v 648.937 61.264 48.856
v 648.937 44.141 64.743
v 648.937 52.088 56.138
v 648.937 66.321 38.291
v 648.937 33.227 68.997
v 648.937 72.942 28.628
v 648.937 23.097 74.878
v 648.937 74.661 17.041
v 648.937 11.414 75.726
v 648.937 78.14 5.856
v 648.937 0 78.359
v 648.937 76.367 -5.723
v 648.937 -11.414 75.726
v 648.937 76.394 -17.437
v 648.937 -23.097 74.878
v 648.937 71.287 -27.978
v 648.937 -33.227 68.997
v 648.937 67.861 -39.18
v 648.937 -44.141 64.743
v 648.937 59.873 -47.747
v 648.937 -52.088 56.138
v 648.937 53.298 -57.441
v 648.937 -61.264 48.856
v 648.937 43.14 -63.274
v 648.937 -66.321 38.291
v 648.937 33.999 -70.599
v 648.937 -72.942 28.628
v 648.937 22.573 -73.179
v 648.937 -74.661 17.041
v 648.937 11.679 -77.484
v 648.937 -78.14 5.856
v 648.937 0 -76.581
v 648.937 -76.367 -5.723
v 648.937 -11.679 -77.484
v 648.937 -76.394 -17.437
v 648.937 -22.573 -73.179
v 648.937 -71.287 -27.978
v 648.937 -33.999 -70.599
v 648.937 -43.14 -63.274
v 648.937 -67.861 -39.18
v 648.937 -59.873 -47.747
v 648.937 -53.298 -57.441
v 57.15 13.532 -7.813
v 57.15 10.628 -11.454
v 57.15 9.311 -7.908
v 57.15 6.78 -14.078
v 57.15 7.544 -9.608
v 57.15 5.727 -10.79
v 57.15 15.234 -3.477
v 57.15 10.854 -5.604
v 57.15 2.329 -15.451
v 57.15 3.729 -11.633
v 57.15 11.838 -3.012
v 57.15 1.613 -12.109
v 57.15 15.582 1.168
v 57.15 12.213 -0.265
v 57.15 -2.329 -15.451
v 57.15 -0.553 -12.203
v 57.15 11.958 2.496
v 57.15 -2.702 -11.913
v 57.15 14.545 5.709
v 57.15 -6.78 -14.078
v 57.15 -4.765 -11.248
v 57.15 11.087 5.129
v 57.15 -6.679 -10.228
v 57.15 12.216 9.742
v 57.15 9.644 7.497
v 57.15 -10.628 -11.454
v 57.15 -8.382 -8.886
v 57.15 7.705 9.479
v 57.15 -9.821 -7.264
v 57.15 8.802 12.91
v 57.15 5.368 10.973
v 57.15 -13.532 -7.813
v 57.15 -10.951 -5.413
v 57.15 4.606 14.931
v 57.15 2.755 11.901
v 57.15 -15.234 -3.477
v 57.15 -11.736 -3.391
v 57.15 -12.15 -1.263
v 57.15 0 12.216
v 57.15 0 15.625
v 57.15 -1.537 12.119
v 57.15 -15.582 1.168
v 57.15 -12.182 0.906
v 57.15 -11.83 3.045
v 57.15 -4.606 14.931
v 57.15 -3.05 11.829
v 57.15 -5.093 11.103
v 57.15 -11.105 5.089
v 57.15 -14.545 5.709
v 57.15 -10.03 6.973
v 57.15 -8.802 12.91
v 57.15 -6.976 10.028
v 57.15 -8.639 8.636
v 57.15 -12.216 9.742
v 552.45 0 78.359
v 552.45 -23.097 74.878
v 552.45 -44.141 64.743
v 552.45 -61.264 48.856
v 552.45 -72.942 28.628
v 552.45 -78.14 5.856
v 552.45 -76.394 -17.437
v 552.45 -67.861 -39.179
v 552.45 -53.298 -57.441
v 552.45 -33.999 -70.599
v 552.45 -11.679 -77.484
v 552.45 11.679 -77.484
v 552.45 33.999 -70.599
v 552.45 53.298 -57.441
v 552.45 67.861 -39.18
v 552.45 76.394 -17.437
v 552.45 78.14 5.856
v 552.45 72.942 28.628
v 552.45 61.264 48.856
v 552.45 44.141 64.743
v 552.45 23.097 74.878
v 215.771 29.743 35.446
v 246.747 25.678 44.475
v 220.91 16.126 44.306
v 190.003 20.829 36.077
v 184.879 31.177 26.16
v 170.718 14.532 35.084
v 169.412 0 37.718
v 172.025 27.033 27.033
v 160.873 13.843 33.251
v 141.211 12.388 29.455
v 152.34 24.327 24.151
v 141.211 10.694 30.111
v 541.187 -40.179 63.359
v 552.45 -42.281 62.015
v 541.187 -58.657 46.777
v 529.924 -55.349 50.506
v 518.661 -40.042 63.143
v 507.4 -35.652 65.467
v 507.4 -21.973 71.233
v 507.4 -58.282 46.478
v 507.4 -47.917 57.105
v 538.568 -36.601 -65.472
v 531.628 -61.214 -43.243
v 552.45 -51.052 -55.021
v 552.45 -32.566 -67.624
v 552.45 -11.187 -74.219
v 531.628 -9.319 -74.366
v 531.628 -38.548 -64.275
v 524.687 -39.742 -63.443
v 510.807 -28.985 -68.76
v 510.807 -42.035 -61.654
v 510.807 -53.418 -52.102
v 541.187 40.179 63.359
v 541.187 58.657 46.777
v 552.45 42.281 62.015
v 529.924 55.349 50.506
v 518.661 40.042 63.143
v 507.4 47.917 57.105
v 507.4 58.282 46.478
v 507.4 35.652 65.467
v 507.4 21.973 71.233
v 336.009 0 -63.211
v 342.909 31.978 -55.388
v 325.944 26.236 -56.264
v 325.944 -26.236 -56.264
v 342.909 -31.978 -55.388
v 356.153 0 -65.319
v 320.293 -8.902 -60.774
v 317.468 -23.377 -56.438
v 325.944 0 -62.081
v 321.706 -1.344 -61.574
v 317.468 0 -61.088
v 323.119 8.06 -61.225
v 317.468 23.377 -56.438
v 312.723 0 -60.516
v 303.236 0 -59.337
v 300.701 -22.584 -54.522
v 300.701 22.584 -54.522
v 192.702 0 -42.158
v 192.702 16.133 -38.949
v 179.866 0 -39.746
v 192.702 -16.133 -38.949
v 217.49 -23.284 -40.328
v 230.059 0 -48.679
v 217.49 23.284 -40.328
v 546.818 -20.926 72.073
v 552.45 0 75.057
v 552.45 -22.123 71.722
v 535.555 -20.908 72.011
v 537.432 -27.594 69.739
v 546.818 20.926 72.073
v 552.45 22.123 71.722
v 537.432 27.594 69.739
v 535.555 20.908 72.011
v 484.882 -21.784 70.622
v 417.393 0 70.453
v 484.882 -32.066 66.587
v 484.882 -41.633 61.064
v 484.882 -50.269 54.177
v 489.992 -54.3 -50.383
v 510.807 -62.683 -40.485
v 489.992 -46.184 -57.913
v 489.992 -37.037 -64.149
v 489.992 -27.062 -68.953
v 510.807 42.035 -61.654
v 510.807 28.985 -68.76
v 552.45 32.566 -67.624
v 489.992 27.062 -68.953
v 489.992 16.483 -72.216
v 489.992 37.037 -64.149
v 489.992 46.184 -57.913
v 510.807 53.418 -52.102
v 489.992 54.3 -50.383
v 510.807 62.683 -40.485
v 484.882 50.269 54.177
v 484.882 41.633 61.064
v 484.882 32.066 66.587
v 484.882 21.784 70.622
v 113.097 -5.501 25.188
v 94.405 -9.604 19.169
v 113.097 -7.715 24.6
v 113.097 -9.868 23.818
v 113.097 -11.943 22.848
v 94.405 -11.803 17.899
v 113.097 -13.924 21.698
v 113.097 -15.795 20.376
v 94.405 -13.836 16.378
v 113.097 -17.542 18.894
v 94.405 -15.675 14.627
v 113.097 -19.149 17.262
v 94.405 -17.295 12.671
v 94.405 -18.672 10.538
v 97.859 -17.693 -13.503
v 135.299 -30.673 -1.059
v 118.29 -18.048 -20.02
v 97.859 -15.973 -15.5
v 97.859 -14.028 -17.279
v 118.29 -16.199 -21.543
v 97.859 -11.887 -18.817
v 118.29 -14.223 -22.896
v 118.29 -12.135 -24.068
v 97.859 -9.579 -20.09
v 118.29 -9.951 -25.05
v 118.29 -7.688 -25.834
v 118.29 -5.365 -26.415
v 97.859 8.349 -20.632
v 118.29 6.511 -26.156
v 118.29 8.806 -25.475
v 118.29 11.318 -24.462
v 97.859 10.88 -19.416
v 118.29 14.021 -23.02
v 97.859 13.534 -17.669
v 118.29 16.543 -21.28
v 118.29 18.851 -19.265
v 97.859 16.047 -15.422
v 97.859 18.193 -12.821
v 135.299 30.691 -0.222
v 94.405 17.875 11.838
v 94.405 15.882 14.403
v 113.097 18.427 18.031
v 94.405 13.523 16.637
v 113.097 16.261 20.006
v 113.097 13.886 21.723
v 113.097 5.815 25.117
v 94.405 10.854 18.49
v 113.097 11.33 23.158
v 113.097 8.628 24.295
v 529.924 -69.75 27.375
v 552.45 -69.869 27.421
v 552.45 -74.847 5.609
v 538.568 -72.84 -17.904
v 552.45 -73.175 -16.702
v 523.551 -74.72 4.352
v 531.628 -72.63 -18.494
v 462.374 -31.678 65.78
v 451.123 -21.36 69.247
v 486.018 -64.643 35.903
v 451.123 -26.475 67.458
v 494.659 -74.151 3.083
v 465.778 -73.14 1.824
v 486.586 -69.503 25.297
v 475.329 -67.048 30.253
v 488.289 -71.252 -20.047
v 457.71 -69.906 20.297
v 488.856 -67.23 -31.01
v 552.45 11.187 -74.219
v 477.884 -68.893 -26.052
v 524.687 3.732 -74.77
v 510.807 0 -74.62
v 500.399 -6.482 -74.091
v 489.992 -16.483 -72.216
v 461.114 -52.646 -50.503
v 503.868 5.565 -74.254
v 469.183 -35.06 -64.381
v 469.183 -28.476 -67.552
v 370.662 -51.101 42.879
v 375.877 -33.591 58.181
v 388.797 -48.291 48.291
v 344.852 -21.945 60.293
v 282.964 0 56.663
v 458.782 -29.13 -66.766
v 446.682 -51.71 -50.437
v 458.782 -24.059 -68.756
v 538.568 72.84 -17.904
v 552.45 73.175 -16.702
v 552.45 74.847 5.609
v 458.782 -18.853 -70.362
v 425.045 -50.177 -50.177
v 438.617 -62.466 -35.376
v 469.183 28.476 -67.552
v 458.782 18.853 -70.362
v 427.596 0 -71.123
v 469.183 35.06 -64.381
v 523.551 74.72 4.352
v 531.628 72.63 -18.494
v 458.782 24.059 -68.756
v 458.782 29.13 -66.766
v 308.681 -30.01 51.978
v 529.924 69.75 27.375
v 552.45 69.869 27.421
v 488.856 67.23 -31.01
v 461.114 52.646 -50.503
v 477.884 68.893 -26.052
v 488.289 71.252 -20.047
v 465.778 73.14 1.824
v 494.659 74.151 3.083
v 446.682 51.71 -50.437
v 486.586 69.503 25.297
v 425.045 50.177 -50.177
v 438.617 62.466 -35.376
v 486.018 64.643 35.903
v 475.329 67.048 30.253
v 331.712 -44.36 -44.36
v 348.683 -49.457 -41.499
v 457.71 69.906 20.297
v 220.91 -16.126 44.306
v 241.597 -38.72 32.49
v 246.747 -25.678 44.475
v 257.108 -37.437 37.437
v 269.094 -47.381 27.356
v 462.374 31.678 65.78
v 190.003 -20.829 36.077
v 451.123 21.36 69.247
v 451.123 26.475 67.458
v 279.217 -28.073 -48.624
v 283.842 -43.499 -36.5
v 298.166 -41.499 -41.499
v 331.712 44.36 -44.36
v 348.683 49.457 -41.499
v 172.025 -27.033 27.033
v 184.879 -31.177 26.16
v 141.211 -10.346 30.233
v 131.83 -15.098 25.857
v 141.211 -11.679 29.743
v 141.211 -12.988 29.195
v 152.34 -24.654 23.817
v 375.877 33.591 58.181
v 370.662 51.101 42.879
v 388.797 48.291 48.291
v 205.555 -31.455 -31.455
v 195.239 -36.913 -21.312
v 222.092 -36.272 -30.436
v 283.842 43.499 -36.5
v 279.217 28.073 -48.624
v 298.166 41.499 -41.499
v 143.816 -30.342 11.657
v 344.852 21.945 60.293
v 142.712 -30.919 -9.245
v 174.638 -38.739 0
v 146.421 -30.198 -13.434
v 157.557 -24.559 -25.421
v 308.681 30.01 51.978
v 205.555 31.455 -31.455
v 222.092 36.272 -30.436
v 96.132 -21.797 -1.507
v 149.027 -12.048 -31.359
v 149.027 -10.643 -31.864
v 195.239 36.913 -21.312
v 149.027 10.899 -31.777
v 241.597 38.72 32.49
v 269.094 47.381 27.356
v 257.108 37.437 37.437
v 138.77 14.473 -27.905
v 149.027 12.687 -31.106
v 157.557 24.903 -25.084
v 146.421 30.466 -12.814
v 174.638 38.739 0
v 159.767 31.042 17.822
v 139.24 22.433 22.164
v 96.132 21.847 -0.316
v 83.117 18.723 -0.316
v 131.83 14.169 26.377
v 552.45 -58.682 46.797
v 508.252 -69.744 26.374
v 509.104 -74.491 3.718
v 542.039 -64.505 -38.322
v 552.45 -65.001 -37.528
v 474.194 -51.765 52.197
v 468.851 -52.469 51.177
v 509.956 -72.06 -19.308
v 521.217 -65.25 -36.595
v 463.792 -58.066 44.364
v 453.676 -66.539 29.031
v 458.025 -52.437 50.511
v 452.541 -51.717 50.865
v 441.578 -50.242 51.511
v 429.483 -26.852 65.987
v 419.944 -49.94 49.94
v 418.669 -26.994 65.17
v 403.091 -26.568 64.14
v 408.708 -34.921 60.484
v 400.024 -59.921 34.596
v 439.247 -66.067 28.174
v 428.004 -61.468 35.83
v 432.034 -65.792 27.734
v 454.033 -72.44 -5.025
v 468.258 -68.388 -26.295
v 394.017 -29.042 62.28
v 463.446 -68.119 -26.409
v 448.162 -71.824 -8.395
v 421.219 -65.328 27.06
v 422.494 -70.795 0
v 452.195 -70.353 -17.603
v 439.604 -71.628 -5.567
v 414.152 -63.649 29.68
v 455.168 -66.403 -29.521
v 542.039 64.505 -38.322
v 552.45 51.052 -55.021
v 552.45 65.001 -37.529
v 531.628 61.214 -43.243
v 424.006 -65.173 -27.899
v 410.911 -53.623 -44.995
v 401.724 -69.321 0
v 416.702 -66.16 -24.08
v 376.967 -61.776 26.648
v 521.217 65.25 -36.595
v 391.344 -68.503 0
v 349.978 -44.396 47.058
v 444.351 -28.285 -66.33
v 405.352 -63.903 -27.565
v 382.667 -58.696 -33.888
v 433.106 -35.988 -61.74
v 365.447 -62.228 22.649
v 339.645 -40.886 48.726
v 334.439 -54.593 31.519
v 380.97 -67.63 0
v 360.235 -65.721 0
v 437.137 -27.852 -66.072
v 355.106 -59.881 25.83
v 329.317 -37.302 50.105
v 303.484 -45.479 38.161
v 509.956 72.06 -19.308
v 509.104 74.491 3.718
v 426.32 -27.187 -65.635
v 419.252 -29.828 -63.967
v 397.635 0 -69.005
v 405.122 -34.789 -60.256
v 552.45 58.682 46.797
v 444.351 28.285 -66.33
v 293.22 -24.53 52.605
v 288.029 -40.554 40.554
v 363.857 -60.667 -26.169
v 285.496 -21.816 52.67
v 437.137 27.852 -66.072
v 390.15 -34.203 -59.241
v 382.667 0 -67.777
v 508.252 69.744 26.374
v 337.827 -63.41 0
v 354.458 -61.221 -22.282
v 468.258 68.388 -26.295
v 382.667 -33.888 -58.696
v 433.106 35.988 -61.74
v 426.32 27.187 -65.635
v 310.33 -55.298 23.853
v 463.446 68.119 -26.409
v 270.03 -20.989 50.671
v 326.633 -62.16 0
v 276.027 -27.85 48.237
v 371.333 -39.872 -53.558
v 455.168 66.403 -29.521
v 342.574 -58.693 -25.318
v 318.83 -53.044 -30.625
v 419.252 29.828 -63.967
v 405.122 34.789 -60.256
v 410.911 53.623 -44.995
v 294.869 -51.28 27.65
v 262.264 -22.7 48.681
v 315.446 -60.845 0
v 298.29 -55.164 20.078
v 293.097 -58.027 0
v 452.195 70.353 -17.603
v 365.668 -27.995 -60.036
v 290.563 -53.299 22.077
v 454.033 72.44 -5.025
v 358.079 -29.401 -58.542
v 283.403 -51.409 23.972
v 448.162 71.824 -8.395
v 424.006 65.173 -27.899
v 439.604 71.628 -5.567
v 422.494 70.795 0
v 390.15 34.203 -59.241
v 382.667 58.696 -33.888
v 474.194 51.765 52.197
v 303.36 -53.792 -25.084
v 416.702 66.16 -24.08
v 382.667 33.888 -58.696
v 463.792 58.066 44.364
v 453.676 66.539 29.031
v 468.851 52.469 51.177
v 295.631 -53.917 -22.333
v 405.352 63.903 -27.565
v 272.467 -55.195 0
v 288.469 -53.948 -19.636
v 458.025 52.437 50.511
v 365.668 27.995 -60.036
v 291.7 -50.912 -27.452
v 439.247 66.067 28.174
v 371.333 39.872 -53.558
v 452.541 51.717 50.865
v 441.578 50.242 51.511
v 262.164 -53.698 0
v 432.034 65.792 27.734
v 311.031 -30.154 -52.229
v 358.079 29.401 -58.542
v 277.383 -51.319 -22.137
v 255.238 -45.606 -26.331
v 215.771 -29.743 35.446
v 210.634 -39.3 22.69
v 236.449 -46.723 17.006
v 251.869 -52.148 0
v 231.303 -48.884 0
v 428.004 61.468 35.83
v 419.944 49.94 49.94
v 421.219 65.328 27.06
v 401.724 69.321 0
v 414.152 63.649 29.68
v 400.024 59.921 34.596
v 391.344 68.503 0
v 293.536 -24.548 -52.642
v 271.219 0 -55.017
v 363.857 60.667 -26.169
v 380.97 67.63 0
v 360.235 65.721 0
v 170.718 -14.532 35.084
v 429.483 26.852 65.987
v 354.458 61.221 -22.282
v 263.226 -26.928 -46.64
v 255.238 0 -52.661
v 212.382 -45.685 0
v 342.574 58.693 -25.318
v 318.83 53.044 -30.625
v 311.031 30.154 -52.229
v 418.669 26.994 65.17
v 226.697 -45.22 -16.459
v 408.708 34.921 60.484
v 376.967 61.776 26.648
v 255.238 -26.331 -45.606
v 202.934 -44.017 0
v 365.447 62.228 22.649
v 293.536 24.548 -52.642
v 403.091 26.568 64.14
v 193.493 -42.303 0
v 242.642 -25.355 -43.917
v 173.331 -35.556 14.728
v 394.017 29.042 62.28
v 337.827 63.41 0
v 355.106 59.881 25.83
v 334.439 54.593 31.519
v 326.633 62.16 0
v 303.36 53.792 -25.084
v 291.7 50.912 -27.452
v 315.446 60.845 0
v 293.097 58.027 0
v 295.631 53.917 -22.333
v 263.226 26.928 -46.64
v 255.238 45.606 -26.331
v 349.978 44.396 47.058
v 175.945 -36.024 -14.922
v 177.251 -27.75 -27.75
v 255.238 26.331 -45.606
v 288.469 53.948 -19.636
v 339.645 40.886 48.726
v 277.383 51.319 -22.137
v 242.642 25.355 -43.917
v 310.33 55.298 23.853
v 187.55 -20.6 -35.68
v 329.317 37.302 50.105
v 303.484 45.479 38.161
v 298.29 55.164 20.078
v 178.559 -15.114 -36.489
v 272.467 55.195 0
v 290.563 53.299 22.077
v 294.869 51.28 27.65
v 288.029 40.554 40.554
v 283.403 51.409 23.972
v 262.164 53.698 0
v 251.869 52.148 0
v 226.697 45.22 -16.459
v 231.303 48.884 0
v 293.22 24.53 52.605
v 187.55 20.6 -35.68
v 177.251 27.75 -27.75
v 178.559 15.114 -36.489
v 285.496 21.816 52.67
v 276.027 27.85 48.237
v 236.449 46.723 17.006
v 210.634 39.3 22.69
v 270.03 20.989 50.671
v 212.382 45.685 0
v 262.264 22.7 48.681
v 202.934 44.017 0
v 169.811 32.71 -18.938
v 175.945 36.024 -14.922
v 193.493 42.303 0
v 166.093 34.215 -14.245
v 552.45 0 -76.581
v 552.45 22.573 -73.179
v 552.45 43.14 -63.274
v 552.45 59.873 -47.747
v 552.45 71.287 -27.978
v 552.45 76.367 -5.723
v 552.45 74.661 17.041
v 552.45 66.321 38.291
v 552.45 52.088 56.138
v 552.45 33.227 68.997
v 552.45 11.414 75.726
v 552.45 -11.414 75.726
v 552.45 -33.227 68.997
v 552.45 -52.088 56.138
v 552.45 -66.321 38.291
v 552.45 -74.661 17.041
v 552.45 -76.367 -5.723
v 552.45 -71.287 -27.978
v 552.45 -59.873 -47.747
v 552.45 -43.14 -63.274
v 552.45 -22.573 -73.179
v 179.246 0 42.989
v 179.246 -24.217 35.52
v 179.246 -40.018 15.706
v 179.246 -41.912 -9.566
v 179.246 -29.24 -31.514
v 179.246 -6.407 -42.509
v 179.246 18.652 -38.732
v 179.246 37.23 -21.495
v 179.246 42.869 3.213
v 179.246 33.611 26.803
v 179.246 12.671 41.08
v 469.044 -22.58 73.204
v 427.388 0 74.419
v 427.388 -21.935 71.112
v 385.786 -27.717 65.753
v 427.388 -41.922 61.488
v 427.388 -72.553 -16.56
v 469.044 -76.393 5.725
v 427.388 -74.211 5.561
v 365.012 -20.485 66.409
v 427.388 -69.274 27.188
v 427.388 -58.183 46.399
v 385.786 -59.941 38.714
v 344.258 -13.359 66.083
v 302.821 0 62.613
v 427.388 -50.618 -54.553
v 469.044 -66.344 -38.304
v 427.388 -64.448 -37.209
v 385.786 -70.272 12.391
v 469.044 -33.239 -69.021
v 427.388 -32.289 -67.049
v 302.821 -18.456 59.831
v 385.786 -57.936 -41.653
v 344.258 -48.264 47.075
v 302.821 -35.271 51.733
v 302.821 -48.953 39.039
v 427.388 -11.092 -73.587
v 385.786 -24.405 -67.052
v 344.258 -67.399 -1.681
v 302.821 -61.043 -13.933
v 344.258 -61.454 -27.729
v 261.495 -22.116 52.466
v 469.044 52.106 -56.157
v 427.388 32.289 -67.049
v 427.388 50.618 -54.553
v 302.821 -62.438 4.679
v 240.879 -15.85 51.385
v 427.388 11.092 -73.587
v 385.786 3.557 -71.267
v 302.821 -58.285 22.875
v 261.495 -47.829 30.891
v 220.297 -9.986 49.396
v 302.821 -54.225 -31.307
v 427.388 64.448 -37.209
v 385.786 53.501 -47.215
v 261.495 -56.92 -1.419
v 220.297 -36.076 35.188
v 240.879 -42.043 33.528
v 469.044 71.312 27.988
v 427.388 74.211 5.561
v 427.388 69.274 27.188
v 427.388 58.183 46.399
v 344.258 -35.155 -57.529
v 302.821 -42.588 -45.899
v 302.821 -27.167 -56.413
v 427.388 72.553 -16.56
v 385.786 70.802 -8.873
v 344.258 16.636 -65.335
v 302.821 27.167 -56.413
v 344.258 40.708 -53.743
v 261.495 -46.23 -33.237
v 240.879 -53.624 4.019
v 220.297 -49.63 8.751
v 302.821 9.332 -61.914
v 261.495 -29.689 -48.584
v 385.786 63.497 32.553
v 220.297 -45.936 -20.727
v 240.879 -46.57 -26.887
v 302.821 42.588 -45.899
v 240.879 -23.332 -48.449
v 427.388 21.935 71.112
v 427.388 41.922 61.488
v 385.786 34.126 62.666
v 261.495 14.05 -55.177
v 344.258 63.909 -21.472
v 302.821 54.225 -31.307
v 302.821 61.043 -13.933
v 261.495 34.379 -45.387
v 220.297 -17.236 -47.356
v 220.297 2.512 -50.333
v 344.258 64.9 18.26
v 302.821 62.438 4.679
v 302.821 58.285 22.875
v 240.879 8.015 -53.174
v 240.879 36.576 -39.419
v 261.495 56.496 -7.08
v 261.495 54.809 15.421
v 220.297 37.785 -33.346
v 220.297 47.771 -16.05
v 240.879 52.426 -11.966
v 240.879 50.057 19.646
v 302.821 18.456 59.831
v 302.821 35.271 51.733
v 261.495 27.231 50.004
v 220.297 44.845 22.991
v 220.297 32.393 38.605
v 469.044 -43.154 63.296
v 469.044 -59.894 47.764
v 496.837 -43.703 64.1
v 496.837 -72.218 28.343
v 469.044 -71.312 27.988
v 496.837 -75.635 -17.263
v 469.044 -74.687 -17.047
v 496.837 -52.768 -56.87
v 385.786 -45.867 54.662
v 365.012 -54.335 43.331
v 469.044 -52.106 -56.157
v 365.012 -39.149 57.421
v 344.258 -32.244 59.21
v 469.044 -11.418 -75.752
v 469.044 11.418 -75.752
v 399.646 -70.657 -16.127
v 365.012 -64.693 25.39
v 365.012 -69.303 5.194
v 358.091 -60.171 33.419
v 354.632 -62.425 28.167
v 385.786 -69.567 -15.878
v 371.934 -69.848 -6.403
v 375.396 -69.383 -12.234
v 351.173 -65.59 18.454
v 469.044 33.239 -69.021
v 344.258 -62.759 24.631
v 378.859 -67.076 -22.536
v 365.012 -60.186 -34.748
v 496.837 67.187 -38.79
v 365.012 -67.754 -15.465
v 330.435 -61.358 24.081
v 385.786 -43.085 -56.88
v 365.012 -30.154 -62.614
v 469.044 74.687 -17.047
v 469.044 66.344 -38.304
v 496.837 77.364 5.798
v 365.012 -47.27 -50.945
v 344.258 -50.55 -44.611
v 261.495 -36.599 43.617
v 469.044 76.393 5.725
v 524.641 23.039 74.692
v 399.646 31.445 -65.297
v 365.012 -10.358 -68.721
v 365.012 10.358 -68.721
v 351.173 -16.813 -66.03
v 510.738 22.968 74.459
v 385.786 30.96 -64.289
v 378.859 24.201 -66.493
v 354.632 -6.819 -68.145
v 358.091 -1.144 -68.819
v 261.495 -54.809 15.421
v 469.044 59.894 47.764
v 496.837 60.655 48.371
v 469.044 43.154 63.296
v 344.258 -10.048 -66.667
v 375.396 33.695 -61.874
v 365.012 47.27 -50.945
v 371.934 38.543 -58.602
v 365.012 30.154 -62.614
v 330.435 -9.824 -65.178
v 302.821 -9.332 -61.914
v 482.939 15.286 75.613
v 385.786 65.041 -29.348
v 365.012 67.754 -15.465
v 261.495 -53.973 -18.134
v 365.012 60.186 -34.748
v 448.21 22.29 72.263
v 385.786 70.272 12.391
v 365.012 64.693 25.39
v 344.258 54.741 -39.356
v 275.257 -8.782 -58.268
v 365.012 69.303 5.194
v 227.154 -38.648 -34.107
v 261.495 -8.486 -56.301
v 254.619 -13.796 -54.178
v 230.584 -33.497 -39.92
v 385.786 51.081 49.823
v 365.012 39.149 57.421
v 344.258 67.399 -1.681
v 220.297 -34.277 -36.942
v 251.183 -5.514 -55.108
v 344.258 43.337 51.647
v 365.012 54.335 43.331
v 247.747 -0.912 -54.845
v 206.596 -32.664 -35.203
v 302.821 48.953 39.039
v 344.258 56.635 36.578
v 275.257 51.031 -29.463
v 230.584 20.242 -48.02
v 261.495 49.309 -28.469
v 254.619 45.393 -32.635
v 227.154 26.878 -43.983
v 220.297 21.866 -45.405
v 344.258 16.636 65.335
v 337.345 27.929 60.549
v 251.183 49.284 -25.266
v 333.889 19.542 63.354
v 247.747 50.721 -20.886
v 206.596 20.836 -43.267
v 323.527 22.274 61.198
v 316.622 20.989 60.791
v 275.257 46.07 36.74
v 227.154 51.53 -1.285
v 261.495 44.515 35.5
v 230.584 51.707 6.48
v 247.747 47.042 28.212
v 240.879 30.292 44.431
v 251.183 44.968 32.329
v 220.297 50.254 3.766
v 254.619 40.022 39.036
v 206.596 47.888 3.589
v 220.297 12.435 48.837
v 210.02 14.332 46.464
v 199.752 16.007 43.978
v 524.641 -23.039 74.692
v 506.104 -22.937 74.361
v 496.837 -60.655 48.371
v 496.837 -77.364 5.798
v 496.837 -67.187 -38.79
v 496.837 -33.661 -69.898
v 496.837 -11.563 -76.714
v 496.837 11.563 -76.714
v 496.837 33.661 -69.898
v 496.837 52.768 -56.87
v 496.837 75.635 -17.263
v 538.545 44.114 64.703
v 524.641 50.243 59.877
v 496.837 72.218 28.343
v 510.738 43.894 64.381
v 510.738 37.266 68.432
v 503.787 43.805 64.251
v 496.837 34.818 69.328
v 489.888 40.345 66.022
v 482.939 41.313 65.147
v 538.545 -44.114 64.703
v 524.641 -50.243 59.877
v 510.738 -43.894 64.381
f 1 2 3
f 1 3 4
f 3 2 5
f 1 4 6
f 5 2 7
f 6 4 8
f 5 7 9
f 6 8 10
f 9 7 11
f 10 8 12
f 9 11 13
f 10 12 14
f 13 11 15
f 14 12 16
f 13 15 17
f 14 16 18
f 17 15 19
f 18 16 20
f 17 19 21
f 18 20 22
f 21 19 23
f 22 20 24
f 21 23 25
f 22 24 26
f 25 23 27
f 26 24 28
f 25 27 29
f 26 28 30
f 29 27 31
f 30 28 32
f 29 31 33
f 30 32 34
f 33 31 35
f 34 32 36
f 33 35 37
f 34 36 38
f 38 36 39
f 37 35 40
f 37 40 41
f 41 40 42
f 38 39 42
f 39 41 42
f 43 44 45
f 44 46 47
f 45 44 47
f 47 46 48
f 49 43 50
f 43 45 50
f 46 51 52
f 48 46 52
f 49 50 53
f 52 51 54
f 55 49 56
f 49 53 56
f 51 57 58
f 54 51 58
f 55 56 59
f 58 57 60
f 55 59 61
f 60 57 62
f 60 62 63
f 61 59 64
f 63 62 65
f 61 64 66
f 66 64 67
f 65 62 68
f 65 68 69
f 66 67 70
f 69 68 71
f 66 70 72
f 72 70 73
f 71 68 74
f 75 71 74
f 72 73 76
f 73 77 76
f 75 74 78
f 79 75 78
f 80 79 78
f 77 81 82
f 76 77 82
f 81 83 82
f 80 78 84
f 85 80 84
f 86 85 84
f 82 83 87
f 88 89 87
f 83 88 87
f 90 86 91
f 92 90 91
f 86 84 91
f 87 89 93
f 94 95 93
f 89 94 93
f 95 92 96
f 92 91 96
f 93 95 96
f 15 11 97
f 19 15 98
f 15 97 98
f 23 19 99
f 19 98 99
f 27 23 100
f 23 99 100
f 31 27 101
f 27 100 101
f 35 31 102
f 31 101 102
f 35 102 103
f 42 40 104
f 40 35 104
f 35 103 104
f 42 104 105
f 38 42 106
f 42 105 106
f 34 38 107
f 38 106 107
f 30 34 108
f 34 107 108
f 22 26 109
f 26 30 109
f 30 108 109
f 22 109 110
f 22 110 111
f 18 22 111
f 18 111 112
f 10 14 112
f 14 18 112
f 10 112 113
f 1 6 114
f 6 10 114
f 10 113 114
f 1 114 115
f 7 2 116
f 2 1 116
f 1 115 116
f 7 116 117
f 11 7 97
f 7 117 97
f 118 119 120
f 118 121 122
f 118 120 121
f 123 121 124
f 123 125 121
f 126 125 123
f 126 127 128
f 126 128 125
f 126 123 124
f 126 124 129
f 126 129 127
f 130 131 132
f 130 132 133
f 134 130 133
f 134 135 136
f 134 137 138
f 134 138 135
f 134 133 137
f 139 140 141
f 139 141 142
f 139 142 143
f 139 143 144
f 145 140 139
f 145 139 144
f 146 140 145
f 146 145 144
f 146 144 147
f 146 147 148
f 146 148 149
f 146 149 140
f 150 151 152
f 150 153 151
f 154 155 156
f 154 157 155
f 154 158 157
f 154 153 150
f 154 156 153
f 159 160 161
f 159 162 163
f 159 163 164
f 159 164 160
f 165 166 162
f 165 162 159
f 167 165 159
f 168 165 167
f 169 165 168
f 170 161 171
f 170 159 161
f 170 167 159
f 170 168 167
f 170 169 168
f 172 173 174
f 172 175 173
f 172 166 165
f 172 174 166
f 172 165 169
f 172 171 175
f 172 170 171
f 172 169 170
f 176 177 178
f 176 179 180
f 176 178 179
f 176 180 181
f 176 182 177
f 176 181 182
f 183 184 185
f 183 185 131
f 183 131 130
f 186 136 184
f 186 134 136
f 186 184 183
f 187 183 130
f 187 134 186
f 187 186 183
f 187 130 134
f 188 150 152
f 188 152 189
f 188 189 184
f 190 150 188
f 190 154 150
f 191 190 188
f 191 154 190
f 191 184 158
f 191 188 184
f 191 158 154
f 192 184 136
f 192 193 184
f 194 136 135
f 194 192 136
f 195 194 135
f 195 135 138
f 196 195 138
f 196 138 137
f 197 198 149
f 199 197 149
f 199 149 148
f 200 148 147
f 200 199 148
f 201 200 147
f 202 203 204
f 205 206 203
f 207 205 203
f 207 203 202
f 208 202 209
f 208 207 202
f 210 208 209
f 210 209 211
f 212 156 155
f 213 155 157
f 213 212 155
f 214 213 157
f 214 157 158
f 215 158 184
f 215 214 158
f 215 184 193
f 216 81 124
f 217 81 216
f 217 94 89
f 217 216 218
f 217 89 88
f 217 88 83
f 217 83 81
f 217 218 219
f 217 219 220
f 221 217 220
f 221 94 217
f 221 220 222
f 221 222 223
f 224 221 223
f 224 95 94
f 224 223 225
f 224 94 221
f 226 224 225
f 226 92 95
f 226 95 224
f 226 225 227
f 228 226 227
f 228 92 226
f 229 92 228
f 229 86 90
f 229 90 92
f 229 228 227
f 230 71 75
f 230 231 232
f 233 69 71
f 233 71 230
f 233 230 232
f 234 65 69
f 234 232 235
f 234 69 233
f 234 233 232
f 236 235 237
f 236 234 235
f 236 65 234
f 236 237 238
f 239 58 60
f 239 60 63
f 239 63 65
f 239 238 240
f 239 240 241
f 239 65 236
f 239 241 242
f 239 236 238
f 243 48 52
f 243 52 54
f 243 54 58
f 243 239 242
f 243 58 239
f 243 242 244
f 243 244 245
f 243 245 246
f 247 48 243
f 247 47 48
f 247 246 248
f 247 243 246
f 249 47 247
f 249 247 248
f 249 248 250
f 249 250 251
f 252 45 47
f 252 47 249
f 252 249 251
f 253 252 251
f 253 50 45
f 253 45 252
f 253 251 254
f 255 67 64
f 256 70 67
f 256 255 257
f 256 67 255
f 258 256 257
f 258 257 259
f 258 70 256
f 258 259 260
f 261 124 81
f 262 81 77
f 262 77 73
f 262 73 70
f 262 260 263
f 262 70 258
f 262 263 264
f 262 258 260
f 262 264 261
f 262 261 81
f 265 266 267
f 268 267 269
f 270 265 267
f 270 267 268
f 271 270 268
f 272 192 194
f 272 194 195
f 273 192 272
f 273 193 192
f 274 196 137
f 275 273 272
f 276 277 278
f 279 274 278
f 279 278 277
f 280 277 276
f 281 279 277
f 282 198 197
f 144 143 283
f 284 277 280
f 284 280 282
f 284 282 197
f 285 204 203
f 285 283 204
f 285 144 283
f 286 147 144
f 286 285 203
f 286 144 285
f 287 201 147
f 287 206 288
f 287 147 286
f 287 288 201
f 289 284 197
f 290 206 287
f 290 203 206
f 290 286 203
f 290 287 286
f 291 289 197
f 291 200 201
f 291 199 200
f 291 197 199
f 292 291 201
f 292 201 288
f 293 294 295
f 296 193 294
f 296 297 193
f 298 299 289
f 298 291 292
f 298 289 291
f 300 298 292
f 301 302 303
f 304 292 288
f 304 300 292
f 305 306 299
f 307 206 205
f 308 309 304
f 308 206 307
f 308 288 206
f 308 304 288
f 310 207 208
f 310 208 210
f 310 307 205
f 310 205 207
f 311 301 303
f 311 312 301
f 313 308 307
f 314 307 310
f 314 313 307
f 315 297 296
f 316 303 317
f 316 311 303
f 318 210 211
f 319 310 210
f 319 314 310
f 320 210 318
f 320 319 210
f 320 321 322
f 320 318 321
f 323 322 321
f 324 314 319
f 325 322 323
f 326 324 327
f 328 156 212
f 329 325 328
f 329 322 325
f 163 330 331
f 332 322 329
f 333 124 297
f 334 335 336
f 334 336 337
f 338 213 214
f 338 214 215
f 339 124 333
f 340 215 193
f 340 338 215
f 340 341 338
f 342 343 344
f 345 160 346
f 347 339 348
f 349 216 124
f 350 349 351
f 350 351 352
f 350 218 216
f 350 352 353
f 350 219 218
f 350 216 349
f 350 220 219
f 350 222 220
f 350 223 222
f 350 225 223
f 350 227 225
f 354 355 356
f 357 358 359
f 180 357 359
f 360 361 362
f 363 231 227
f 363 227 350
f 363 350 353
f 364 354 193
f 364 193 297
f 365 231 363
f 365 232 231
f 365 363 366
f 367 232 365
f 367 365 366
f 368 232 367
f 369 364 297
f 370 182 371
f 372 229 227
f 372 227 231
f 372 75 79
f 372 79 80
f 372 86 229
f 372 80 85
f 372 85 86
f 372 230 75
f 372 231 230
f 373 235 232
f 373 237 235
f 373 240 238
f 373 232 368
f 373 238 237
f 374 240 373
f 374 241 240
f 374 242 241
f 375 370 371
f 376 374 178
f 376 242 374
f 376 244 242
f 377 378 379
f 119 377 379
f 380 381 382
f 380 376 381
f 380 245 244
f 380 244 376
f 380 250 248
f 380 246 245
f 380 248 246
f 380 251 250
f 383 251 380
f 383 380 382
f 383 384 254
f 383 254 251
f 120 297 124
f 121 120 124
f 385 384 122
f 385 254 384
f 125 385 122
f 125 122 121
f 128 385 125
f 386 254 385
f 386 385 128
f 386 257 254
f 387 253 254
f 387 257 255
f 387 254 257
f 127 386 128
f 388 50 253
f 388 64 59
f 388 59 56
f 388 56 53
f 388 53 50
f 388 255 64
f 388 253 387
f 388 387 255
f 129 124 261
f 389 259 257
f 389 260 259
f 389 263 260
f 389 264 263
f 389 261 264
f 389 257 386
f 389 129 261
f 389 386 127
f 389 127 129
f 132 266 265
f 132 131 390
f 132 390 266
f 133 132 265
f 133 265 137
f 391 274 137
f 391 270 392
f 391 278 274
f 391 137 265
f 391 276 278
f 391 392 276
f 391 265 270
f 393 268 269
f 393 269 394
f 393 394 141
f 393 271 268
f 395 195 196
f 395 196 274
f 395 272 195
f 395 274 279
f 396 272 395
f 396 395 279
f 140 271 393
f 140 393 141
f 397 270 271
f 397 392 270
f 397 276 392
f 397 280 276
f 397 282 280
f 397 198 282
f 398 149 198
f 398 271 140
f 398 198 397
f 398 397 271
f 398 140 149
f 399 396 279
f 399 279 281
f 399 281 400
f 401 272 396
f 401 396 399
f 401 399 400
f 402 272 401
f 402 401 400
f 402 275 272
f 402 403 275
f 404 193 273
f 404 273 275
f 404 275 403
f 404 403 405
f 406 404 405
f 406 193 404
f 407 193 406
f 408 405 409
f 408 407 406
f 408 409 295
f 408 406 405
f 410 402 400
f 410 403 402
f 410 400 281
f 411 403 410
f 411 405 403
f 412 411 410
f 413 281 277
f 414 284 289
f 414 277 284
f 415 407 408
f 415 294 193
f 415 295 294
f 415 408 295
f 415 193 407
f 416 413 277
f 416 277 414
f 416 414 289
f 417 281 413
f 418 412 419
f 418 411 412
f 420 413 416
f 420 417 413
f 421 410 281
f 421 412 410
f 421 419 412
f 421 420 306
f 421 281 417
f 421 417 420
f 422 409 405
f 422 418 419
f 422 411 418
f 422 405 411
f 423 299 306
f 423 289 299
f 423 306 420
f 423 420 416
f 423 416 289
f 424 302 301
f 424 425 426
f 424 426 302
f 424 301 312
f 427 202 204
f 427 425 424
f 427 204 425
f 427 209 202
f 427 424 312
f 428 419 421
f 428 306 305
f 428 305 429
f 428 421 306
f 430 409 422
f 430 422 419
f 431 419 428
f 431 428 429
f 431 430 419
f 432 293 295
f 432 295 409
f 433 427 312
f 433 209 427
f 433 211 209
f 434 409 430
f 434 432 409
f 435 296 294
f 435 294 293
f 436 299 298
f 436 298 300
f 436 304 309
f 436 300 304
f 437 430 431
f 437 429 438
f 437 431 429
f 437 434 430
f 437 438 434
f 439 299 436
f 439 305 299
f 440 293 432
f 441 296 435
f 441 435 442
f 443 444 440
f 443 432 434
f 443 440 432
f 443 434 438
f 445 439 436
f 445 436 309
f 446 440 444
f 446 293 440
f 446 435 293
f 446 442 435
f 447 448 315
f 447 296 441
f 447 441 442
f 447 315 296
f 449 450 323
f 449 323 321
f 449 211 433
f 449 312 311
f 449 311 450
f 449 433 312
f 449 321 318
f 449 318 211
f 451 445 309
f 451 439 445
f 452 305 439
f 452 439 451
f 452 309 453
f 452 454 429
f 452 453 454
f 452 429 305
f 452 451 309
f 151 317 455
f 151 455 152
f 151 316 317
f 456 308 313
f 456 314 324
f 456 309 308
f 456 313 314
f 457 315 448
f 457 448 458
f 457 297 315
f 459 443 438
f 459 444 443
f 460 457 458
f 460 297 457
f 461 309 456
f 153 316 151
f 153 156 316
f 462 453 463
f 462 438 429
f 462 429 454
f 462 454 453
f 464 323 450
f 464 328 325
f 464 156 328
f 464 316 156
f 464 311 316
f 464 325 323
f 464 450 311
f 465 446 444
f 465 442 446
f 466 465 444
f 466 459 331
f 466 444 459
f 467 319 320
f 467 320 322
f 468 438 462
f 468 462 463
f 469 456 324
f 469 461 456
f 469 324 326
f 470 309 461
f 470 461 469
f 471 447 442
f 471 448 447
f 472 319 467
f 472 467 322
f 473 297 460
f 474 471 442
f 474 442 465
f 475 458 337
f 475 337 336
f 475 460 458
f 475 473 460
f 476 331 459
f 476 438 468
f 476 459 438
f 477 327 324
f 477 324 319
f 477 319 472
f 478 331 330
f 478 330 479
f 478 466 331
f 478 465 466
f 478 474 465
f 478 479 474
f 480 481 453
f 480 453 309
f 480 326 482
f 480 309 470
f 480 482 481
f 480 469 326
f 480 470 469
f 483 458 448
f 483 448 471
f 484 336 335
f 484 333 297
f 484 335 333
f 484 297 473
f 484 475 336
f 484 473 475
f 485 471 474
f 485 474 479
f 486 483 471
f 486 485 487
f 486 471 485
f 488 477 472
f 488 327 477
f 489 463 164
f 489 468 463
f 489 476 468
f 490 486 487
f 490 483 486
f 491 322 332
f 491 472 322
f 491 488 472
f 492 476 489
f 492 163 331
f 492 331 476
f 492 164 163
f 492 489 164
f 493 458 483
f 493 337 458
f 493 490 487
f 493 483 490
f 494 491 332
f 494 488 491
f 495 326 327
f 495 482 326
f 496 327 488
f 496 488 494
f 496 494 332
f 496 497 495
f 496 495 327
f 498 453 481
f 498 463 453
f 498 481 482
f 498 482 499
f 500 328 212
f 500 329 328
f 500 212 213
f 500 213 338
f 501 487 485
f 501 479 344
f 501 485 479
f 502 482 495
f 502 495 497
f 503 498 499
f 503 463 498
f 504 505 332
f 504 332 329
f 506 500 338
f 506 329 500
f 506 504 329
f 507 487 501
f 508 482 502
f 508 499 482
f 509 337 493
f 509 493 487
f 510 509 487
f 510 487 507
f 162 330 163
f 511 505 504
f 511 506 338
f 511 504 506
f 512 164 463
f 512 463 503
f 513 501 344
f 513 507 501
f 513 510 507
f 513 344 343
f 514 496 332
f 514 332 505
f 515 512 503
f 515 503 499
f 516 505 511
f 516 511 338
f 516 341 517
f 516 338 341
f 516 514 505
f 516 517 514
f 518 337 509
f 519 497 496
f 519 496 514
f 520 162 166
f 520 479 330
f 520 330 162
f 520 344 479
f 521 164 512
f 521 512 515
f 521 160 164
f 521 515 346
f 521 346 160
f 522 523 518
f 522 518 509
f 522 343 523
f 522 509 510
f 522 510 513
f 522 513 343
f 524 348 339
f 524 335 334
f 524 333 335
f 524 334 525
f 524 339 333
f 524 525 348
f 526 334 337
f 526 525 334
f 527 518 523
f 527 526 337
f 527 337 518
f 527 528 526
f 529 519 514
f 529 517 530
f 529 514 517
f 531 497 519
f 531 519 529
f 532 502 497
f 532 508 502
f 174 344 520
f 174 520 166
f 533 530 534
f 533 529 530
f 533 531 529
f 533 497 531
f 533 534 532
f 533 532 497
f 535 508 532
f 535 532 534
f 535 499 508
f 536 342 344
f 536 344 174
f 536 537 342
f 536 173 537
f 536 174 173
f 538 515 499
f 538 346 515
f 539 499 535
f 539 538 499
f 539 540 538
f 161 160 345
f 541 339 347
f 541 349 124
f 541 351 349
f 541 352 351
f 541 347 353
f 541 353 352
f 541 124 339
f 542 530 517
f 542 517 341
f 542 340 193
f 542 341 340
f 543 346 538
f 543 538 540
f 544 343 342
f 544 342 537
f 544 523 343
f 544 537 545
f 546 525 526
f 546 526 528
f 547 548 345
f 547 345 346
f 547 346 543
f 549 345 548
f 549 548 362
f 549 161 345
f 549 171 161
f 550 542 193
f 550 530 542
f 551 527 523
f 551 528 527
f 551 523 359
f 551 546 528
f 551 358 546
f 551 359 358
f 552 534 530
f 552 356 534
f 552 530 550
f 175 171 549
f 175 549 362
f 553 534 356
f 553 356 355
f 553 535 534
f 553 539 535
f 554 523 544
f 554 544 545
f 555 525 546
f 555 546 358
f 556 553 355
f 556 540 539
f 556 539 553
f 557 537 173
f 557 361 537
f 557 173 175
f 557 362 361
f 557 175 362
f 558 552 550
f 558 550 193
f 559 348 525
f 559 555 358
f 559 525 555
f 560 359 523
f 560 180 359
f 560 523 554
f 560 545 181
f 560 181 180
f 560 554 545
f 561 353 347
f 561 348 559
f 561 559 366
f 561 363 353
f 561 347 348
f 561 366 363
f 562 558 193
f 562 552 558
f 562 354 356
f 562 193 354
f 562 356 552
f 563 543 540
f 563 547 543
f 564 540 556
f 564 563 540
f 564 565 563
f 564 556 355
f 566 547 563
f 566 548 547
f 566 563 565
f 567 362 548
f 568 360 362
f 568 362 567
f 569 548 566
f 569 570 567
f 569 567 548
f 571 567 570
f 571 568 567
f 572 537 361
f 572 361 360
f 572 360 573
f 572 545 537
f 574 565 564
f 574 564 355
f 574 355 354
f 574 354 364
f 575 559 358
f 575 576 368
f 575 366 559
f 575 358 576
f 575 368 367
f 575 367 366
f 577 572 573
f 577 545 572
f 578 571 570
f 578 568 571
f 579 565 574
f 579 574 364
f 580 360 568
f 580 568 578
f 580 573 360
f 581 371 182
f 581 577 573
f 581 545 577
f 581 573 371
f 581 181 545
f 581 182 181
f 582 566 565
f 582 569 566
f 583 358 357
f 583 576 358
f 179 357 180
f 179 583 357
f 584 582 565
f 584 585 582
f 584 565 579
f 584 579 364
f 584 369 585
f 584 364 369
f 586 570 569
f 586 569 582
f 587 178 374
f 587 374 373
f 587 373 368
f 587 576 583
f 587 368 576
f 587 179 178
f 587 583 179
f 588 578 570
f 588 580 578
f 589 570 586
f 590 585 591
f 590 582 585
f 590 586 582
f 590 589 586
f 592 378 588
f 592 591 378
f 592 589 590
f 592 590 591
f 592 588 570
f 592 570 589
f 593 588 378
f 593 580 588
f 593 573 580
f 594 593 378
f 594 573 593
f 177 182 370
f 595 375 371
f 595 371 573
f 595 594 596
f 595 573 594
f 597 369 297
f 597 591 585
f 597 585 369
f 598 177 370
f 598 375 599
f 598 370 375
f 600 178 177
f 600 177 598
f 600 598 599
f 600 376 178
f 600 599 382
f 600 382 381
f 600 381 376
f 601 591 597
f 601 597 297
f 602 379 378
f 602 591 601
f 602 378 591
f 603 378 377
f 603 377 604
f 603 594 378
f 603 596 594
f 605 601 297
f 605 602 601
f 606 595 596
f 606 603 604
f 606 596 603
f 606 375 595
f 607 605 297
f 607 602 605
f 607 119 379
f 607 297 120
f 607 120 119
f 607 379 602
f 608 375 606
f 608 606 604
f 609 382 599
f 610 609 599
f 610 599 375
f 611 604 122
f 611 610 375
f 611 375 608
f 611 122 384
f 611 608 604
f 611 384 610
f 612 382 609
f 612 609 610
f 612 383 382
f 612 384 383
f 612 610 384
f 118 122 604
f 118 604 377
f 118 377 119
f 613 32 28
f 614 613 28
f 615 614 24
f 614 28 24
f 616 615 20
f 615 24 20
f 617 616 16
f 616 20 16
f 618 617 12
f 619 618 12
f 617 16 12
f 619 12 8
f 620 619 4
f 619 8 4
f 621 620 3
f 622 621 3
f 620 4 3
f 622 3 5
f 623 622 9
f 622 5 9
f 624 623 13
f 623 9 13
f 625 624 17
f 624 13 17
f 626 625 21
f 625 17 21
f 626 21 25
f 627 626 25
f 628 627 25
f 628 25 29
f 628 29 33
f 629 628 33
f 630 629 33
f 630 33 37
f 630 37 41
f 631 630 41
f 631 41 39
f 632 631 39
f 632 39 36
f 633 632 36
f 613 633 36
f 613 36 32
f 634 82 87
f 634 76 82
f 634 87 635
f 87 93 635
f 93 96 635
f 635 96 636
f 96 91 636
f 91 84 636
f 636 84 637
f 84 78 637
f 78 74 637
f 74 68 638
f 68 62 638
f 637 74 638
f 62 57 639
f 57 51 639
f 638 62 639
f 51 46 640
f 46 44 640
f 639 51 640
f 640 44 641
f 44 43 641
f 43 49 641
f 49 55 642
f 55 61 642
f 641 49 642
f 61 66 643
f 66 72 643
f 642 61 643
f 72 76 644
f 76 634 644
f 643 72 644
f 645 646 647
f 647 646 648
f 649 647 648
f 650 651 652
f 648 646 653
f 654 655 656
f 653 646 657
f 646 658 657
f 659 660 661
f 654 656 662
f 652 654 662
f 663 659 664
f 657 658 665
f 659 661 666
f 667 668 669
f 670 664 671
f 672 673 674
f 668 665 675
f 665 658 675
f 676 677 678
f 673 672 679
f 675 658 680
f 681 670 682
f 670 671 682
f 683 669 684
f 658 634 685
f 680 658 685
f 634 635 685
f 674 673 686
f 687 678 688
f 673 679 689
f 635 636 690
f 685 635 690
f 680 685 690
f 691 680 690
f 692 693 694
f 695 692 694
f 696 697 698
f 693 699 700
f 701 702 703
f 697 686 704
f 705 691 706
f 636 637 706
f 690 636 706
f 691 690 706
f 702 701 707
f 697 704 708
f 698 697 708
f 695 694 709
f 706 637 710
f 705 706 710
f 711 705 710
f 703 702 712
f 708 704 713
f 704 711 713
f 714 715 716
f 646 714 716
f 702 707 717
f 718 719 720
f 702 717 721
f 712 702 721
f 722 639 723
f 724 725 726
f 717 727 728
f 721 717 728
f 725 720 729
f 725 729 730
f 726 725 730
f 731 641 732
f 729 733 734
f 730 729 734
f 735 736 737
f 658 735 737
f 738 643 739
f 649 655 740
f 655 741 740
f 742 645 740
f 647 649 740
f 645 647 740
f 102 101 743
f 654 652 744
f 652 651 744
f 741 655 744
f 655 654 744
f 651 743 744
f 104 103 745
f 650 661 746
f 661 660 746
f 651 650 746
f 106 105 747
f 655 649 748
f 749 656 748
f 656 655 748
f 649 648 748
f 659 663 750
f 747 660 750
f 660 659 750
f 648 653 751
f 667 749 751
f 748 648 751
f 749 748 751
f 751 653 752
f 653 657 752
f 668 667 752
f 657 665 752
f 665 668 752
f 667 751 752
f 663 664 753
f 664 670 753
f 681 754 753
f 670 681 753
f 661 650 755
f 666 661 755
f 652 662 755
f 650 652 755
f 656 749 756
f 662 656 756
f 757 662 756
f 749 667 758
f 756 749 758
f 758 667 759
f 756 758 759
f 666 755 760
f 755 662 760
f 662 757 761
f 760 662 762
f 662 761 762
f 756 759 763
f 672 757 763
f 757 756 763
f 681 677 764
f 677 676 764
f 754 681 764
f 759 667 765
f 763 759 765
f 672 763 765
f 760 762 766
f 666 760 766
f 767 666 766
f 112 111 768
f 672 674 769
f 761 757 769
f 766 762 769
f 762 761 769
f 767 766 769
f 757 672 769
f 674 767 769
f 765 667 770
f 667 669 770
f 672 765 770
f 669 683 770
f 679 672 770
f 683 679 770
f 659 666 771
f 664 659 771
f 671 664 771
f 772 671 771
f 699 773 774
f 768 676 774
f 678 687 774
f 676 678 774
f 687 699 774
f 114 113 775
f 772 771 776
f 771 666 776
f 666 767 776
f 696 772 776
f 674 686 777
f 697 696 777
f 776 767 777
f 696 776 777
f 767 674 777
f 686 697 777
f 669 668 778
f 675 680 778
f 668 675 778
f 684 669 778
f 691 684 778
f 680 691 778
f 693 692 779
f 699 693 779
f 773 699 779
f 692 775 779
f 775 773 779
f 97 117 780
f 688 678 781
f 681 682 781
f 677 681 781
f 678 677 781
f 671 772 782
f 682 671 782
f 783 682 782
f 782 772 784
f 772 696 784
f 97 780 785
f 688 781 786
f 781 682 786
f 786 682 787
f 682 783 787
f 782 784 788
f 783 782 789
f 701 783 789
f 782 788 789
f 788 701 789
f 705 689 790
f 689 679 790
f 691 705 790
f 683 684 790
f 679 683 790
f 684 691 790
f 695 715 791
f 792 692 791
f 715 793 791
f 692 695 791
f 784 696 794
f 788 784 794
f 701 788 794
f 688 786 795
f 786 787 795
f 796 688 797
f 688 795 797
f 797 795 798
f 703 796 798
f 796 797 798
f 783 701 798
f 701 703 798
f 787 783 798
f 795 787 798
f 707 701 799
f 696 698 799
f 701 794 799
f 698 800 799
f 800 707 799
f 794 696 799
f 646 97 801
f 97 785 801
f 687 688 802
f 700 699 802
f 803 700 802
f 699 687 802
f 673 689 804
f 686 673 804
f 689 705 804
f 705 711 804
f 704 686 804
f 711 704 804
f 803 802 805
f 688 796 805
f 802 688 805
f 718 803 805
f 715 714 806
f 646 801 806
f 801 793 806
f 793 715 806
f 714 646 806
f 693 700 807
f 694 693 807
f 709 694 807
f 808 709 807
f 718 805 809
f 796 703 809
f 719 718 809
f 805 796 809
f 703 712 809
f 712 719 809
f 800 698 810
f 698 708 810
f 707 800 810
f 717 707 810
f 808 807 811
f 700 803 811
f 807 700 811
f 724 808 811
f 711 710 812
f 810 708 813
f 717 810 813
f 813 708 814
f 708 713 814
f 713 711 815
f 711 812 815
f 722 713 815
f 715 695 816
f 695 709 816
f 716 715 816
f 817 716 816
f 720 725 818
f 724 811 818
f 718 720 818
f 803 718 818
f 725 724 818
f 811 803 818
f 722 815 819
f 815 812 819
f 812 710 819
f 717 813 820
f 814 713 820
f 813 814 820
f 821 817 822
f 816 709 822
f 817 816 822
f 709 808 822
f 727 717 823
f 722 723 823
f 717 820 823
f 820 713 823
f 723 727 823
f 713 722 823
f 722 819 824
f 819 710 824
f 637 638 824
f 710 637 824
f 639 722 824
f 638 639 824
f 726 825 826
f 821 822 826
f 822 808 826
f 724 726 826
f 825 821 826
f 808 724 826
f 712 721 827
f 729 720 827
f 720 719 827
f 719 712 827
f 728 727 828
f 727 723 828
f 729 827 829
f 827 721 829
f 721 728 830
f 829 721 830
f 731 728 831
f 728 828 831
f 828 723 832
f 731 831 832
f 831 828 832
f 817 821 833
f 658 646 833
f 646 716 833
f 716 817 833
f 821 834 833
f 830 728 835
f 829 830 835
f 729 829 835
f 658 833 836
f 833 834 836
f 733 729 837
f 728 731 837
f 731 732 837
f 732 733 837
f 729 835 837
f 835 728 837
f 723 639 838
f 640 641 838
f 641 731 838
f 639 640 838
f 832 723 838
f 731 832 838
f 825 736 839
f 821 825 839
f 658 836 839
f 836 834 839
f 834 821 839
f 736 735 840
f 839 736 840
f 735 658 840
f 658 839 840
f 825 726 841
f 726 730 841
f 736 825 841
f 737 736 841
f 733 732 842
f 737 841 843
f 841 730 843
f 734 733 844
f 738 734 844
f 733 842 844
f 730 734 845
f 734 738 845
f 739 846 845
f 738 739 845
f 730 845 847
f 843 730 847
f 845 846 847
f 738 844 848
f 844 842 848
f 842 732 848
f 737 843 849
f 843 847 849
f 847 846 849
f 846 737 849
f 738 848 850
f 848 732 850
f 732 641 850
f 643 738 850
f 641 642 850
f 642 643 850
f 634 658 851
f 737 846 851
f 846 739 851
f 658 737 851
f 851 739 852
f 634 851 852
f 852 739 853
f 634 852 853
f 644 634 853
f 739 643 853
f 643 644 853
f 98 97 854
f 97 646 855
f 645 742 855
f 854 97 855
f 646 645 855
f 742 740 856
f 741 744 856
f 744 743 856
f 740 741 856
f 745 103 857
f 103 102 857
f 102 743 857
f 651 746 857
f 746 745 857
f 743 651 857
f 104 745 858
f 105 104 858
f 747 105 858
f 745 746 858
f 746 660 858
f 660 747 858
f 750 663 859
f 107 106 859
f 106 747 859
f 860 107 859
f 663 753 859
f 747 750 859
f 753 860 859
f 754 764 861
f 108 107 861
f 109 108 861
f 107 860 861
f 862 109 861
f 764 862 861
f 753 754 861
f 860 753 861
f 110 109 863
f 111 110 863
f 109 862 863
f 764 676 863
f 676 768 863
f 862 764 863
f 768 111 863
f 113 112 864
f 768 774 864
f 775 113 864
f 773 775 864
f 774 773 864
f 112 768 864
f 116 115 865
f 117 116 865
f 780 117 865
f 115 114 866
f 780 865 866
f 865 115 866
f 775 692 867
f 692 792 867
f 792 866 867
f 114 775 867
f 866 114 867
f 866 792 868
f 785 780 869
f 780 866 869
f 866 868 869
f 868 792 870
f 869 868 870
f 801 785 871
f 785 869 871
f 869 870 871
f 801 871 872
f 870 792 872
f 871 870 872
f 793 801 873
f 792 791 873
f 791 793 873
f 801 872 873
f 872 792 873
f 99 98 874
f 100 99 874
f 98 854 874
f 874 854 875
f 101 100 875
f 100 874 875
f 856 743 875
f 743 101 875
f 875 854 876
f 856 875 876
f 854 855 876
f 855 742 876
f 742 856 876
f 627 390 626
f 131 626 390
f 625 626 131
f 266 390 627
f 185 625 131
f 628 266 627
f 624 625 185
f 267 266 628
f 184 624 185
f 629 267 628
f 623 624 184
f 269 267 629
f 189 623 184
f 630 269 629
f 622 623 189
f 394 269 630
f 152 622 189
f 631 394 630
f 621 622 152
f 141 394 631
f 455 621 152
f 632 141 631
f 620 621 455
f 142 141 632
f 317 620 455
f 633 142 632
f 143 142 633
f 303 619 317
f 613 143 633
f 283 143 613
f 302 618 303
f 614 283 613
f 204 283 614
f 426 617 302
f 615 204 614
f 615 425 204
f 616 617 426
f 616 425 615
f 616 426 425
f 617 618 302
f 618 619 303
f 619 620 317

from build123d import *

# Parameters (mm, degrees)
OGIVE_SHELL_T           = -3.302
SKETCH7_R               = 76.581
CUT_EXTRUDE8_DEPTH      = 101.6
SKETCH3_W               = 5.112500062
SKETCH3_H               = 156.718
CUT_EXTRUDE5_DEPTH      = 664.371440668
CUT_EXTRUDE5_DEPTH_BACK = 664.371440668


with BuildPart() as part:
    # Ogive Sketch → Ogive Body Revolve (revolve)
    with BuildSketch(Plane.XY, mode=Mode.PRIVATE) as ogive_body_revolve_sk:
        with BuildLine():
            Line((57.15, 0), (654.05, 0))
            Line((654.05, 0), (654.05, 78.359))
            Line((654.05, 78.359), (552.45, 78.359))
            ThreePointArc((552.45, 78.359), (302.821473374, 62.613179), (57.15, 15.625315086))
            Line((57.15, 15.625315086), (57.15, 0))
        make_face()
    revolve(ogive_body_revolve_sk.sketch.rotate(Axis((0, 0, 0), (1, 0, 0)), 90), axis=Axis((0, 0, 0), (1, 0, 0)))

    # Ogive Shell
    ogive_shell_openings = [part.faces().sort_by_distance(p)[0] for p in [
        (654.05, 0, 0),
        (57.15, 0, 0),
    ]]
    offset(amount=OGIVE_SHELL_T, openings=ogive_shell_openings, kind=Kind.INTERSECTION)

    # Sketch7 → Cut-Extrude8 (cut)
    with BuildSketch(Plane(origin=(654.05, 0, 0), x_dir=(0, 0, -1), z_dir=(1, 0, 0))):
        Circle(SKETCH7_R)
    extrude(amount=-CUT_EXTRUDE8_DEPTH, mode=Mode.SUBTRACT)

    # Sketch3 → Cut-Extrude5 (cut, two sides)
    with BuildSketch(Plane(origin=(0, 0, 0), x_dir=(1, 0, 0), z_dir=(0, 1, 0))) as cut_extrude5_sk:
        with Locations((651.493749969, 0)):
            Rectangle(SKETCH3_W, SKETCH3_H)
    extrude(amount=CUT_EXTRUDE5_DEPTH, mode=Mode.SUBTRACT)
    extrude(cut_extrude5_sk.sketch, amount=-CUT_EXTRUDE5_DEPTH_BACK, mode=Mode.SUBTRACT)


solid = part.part
